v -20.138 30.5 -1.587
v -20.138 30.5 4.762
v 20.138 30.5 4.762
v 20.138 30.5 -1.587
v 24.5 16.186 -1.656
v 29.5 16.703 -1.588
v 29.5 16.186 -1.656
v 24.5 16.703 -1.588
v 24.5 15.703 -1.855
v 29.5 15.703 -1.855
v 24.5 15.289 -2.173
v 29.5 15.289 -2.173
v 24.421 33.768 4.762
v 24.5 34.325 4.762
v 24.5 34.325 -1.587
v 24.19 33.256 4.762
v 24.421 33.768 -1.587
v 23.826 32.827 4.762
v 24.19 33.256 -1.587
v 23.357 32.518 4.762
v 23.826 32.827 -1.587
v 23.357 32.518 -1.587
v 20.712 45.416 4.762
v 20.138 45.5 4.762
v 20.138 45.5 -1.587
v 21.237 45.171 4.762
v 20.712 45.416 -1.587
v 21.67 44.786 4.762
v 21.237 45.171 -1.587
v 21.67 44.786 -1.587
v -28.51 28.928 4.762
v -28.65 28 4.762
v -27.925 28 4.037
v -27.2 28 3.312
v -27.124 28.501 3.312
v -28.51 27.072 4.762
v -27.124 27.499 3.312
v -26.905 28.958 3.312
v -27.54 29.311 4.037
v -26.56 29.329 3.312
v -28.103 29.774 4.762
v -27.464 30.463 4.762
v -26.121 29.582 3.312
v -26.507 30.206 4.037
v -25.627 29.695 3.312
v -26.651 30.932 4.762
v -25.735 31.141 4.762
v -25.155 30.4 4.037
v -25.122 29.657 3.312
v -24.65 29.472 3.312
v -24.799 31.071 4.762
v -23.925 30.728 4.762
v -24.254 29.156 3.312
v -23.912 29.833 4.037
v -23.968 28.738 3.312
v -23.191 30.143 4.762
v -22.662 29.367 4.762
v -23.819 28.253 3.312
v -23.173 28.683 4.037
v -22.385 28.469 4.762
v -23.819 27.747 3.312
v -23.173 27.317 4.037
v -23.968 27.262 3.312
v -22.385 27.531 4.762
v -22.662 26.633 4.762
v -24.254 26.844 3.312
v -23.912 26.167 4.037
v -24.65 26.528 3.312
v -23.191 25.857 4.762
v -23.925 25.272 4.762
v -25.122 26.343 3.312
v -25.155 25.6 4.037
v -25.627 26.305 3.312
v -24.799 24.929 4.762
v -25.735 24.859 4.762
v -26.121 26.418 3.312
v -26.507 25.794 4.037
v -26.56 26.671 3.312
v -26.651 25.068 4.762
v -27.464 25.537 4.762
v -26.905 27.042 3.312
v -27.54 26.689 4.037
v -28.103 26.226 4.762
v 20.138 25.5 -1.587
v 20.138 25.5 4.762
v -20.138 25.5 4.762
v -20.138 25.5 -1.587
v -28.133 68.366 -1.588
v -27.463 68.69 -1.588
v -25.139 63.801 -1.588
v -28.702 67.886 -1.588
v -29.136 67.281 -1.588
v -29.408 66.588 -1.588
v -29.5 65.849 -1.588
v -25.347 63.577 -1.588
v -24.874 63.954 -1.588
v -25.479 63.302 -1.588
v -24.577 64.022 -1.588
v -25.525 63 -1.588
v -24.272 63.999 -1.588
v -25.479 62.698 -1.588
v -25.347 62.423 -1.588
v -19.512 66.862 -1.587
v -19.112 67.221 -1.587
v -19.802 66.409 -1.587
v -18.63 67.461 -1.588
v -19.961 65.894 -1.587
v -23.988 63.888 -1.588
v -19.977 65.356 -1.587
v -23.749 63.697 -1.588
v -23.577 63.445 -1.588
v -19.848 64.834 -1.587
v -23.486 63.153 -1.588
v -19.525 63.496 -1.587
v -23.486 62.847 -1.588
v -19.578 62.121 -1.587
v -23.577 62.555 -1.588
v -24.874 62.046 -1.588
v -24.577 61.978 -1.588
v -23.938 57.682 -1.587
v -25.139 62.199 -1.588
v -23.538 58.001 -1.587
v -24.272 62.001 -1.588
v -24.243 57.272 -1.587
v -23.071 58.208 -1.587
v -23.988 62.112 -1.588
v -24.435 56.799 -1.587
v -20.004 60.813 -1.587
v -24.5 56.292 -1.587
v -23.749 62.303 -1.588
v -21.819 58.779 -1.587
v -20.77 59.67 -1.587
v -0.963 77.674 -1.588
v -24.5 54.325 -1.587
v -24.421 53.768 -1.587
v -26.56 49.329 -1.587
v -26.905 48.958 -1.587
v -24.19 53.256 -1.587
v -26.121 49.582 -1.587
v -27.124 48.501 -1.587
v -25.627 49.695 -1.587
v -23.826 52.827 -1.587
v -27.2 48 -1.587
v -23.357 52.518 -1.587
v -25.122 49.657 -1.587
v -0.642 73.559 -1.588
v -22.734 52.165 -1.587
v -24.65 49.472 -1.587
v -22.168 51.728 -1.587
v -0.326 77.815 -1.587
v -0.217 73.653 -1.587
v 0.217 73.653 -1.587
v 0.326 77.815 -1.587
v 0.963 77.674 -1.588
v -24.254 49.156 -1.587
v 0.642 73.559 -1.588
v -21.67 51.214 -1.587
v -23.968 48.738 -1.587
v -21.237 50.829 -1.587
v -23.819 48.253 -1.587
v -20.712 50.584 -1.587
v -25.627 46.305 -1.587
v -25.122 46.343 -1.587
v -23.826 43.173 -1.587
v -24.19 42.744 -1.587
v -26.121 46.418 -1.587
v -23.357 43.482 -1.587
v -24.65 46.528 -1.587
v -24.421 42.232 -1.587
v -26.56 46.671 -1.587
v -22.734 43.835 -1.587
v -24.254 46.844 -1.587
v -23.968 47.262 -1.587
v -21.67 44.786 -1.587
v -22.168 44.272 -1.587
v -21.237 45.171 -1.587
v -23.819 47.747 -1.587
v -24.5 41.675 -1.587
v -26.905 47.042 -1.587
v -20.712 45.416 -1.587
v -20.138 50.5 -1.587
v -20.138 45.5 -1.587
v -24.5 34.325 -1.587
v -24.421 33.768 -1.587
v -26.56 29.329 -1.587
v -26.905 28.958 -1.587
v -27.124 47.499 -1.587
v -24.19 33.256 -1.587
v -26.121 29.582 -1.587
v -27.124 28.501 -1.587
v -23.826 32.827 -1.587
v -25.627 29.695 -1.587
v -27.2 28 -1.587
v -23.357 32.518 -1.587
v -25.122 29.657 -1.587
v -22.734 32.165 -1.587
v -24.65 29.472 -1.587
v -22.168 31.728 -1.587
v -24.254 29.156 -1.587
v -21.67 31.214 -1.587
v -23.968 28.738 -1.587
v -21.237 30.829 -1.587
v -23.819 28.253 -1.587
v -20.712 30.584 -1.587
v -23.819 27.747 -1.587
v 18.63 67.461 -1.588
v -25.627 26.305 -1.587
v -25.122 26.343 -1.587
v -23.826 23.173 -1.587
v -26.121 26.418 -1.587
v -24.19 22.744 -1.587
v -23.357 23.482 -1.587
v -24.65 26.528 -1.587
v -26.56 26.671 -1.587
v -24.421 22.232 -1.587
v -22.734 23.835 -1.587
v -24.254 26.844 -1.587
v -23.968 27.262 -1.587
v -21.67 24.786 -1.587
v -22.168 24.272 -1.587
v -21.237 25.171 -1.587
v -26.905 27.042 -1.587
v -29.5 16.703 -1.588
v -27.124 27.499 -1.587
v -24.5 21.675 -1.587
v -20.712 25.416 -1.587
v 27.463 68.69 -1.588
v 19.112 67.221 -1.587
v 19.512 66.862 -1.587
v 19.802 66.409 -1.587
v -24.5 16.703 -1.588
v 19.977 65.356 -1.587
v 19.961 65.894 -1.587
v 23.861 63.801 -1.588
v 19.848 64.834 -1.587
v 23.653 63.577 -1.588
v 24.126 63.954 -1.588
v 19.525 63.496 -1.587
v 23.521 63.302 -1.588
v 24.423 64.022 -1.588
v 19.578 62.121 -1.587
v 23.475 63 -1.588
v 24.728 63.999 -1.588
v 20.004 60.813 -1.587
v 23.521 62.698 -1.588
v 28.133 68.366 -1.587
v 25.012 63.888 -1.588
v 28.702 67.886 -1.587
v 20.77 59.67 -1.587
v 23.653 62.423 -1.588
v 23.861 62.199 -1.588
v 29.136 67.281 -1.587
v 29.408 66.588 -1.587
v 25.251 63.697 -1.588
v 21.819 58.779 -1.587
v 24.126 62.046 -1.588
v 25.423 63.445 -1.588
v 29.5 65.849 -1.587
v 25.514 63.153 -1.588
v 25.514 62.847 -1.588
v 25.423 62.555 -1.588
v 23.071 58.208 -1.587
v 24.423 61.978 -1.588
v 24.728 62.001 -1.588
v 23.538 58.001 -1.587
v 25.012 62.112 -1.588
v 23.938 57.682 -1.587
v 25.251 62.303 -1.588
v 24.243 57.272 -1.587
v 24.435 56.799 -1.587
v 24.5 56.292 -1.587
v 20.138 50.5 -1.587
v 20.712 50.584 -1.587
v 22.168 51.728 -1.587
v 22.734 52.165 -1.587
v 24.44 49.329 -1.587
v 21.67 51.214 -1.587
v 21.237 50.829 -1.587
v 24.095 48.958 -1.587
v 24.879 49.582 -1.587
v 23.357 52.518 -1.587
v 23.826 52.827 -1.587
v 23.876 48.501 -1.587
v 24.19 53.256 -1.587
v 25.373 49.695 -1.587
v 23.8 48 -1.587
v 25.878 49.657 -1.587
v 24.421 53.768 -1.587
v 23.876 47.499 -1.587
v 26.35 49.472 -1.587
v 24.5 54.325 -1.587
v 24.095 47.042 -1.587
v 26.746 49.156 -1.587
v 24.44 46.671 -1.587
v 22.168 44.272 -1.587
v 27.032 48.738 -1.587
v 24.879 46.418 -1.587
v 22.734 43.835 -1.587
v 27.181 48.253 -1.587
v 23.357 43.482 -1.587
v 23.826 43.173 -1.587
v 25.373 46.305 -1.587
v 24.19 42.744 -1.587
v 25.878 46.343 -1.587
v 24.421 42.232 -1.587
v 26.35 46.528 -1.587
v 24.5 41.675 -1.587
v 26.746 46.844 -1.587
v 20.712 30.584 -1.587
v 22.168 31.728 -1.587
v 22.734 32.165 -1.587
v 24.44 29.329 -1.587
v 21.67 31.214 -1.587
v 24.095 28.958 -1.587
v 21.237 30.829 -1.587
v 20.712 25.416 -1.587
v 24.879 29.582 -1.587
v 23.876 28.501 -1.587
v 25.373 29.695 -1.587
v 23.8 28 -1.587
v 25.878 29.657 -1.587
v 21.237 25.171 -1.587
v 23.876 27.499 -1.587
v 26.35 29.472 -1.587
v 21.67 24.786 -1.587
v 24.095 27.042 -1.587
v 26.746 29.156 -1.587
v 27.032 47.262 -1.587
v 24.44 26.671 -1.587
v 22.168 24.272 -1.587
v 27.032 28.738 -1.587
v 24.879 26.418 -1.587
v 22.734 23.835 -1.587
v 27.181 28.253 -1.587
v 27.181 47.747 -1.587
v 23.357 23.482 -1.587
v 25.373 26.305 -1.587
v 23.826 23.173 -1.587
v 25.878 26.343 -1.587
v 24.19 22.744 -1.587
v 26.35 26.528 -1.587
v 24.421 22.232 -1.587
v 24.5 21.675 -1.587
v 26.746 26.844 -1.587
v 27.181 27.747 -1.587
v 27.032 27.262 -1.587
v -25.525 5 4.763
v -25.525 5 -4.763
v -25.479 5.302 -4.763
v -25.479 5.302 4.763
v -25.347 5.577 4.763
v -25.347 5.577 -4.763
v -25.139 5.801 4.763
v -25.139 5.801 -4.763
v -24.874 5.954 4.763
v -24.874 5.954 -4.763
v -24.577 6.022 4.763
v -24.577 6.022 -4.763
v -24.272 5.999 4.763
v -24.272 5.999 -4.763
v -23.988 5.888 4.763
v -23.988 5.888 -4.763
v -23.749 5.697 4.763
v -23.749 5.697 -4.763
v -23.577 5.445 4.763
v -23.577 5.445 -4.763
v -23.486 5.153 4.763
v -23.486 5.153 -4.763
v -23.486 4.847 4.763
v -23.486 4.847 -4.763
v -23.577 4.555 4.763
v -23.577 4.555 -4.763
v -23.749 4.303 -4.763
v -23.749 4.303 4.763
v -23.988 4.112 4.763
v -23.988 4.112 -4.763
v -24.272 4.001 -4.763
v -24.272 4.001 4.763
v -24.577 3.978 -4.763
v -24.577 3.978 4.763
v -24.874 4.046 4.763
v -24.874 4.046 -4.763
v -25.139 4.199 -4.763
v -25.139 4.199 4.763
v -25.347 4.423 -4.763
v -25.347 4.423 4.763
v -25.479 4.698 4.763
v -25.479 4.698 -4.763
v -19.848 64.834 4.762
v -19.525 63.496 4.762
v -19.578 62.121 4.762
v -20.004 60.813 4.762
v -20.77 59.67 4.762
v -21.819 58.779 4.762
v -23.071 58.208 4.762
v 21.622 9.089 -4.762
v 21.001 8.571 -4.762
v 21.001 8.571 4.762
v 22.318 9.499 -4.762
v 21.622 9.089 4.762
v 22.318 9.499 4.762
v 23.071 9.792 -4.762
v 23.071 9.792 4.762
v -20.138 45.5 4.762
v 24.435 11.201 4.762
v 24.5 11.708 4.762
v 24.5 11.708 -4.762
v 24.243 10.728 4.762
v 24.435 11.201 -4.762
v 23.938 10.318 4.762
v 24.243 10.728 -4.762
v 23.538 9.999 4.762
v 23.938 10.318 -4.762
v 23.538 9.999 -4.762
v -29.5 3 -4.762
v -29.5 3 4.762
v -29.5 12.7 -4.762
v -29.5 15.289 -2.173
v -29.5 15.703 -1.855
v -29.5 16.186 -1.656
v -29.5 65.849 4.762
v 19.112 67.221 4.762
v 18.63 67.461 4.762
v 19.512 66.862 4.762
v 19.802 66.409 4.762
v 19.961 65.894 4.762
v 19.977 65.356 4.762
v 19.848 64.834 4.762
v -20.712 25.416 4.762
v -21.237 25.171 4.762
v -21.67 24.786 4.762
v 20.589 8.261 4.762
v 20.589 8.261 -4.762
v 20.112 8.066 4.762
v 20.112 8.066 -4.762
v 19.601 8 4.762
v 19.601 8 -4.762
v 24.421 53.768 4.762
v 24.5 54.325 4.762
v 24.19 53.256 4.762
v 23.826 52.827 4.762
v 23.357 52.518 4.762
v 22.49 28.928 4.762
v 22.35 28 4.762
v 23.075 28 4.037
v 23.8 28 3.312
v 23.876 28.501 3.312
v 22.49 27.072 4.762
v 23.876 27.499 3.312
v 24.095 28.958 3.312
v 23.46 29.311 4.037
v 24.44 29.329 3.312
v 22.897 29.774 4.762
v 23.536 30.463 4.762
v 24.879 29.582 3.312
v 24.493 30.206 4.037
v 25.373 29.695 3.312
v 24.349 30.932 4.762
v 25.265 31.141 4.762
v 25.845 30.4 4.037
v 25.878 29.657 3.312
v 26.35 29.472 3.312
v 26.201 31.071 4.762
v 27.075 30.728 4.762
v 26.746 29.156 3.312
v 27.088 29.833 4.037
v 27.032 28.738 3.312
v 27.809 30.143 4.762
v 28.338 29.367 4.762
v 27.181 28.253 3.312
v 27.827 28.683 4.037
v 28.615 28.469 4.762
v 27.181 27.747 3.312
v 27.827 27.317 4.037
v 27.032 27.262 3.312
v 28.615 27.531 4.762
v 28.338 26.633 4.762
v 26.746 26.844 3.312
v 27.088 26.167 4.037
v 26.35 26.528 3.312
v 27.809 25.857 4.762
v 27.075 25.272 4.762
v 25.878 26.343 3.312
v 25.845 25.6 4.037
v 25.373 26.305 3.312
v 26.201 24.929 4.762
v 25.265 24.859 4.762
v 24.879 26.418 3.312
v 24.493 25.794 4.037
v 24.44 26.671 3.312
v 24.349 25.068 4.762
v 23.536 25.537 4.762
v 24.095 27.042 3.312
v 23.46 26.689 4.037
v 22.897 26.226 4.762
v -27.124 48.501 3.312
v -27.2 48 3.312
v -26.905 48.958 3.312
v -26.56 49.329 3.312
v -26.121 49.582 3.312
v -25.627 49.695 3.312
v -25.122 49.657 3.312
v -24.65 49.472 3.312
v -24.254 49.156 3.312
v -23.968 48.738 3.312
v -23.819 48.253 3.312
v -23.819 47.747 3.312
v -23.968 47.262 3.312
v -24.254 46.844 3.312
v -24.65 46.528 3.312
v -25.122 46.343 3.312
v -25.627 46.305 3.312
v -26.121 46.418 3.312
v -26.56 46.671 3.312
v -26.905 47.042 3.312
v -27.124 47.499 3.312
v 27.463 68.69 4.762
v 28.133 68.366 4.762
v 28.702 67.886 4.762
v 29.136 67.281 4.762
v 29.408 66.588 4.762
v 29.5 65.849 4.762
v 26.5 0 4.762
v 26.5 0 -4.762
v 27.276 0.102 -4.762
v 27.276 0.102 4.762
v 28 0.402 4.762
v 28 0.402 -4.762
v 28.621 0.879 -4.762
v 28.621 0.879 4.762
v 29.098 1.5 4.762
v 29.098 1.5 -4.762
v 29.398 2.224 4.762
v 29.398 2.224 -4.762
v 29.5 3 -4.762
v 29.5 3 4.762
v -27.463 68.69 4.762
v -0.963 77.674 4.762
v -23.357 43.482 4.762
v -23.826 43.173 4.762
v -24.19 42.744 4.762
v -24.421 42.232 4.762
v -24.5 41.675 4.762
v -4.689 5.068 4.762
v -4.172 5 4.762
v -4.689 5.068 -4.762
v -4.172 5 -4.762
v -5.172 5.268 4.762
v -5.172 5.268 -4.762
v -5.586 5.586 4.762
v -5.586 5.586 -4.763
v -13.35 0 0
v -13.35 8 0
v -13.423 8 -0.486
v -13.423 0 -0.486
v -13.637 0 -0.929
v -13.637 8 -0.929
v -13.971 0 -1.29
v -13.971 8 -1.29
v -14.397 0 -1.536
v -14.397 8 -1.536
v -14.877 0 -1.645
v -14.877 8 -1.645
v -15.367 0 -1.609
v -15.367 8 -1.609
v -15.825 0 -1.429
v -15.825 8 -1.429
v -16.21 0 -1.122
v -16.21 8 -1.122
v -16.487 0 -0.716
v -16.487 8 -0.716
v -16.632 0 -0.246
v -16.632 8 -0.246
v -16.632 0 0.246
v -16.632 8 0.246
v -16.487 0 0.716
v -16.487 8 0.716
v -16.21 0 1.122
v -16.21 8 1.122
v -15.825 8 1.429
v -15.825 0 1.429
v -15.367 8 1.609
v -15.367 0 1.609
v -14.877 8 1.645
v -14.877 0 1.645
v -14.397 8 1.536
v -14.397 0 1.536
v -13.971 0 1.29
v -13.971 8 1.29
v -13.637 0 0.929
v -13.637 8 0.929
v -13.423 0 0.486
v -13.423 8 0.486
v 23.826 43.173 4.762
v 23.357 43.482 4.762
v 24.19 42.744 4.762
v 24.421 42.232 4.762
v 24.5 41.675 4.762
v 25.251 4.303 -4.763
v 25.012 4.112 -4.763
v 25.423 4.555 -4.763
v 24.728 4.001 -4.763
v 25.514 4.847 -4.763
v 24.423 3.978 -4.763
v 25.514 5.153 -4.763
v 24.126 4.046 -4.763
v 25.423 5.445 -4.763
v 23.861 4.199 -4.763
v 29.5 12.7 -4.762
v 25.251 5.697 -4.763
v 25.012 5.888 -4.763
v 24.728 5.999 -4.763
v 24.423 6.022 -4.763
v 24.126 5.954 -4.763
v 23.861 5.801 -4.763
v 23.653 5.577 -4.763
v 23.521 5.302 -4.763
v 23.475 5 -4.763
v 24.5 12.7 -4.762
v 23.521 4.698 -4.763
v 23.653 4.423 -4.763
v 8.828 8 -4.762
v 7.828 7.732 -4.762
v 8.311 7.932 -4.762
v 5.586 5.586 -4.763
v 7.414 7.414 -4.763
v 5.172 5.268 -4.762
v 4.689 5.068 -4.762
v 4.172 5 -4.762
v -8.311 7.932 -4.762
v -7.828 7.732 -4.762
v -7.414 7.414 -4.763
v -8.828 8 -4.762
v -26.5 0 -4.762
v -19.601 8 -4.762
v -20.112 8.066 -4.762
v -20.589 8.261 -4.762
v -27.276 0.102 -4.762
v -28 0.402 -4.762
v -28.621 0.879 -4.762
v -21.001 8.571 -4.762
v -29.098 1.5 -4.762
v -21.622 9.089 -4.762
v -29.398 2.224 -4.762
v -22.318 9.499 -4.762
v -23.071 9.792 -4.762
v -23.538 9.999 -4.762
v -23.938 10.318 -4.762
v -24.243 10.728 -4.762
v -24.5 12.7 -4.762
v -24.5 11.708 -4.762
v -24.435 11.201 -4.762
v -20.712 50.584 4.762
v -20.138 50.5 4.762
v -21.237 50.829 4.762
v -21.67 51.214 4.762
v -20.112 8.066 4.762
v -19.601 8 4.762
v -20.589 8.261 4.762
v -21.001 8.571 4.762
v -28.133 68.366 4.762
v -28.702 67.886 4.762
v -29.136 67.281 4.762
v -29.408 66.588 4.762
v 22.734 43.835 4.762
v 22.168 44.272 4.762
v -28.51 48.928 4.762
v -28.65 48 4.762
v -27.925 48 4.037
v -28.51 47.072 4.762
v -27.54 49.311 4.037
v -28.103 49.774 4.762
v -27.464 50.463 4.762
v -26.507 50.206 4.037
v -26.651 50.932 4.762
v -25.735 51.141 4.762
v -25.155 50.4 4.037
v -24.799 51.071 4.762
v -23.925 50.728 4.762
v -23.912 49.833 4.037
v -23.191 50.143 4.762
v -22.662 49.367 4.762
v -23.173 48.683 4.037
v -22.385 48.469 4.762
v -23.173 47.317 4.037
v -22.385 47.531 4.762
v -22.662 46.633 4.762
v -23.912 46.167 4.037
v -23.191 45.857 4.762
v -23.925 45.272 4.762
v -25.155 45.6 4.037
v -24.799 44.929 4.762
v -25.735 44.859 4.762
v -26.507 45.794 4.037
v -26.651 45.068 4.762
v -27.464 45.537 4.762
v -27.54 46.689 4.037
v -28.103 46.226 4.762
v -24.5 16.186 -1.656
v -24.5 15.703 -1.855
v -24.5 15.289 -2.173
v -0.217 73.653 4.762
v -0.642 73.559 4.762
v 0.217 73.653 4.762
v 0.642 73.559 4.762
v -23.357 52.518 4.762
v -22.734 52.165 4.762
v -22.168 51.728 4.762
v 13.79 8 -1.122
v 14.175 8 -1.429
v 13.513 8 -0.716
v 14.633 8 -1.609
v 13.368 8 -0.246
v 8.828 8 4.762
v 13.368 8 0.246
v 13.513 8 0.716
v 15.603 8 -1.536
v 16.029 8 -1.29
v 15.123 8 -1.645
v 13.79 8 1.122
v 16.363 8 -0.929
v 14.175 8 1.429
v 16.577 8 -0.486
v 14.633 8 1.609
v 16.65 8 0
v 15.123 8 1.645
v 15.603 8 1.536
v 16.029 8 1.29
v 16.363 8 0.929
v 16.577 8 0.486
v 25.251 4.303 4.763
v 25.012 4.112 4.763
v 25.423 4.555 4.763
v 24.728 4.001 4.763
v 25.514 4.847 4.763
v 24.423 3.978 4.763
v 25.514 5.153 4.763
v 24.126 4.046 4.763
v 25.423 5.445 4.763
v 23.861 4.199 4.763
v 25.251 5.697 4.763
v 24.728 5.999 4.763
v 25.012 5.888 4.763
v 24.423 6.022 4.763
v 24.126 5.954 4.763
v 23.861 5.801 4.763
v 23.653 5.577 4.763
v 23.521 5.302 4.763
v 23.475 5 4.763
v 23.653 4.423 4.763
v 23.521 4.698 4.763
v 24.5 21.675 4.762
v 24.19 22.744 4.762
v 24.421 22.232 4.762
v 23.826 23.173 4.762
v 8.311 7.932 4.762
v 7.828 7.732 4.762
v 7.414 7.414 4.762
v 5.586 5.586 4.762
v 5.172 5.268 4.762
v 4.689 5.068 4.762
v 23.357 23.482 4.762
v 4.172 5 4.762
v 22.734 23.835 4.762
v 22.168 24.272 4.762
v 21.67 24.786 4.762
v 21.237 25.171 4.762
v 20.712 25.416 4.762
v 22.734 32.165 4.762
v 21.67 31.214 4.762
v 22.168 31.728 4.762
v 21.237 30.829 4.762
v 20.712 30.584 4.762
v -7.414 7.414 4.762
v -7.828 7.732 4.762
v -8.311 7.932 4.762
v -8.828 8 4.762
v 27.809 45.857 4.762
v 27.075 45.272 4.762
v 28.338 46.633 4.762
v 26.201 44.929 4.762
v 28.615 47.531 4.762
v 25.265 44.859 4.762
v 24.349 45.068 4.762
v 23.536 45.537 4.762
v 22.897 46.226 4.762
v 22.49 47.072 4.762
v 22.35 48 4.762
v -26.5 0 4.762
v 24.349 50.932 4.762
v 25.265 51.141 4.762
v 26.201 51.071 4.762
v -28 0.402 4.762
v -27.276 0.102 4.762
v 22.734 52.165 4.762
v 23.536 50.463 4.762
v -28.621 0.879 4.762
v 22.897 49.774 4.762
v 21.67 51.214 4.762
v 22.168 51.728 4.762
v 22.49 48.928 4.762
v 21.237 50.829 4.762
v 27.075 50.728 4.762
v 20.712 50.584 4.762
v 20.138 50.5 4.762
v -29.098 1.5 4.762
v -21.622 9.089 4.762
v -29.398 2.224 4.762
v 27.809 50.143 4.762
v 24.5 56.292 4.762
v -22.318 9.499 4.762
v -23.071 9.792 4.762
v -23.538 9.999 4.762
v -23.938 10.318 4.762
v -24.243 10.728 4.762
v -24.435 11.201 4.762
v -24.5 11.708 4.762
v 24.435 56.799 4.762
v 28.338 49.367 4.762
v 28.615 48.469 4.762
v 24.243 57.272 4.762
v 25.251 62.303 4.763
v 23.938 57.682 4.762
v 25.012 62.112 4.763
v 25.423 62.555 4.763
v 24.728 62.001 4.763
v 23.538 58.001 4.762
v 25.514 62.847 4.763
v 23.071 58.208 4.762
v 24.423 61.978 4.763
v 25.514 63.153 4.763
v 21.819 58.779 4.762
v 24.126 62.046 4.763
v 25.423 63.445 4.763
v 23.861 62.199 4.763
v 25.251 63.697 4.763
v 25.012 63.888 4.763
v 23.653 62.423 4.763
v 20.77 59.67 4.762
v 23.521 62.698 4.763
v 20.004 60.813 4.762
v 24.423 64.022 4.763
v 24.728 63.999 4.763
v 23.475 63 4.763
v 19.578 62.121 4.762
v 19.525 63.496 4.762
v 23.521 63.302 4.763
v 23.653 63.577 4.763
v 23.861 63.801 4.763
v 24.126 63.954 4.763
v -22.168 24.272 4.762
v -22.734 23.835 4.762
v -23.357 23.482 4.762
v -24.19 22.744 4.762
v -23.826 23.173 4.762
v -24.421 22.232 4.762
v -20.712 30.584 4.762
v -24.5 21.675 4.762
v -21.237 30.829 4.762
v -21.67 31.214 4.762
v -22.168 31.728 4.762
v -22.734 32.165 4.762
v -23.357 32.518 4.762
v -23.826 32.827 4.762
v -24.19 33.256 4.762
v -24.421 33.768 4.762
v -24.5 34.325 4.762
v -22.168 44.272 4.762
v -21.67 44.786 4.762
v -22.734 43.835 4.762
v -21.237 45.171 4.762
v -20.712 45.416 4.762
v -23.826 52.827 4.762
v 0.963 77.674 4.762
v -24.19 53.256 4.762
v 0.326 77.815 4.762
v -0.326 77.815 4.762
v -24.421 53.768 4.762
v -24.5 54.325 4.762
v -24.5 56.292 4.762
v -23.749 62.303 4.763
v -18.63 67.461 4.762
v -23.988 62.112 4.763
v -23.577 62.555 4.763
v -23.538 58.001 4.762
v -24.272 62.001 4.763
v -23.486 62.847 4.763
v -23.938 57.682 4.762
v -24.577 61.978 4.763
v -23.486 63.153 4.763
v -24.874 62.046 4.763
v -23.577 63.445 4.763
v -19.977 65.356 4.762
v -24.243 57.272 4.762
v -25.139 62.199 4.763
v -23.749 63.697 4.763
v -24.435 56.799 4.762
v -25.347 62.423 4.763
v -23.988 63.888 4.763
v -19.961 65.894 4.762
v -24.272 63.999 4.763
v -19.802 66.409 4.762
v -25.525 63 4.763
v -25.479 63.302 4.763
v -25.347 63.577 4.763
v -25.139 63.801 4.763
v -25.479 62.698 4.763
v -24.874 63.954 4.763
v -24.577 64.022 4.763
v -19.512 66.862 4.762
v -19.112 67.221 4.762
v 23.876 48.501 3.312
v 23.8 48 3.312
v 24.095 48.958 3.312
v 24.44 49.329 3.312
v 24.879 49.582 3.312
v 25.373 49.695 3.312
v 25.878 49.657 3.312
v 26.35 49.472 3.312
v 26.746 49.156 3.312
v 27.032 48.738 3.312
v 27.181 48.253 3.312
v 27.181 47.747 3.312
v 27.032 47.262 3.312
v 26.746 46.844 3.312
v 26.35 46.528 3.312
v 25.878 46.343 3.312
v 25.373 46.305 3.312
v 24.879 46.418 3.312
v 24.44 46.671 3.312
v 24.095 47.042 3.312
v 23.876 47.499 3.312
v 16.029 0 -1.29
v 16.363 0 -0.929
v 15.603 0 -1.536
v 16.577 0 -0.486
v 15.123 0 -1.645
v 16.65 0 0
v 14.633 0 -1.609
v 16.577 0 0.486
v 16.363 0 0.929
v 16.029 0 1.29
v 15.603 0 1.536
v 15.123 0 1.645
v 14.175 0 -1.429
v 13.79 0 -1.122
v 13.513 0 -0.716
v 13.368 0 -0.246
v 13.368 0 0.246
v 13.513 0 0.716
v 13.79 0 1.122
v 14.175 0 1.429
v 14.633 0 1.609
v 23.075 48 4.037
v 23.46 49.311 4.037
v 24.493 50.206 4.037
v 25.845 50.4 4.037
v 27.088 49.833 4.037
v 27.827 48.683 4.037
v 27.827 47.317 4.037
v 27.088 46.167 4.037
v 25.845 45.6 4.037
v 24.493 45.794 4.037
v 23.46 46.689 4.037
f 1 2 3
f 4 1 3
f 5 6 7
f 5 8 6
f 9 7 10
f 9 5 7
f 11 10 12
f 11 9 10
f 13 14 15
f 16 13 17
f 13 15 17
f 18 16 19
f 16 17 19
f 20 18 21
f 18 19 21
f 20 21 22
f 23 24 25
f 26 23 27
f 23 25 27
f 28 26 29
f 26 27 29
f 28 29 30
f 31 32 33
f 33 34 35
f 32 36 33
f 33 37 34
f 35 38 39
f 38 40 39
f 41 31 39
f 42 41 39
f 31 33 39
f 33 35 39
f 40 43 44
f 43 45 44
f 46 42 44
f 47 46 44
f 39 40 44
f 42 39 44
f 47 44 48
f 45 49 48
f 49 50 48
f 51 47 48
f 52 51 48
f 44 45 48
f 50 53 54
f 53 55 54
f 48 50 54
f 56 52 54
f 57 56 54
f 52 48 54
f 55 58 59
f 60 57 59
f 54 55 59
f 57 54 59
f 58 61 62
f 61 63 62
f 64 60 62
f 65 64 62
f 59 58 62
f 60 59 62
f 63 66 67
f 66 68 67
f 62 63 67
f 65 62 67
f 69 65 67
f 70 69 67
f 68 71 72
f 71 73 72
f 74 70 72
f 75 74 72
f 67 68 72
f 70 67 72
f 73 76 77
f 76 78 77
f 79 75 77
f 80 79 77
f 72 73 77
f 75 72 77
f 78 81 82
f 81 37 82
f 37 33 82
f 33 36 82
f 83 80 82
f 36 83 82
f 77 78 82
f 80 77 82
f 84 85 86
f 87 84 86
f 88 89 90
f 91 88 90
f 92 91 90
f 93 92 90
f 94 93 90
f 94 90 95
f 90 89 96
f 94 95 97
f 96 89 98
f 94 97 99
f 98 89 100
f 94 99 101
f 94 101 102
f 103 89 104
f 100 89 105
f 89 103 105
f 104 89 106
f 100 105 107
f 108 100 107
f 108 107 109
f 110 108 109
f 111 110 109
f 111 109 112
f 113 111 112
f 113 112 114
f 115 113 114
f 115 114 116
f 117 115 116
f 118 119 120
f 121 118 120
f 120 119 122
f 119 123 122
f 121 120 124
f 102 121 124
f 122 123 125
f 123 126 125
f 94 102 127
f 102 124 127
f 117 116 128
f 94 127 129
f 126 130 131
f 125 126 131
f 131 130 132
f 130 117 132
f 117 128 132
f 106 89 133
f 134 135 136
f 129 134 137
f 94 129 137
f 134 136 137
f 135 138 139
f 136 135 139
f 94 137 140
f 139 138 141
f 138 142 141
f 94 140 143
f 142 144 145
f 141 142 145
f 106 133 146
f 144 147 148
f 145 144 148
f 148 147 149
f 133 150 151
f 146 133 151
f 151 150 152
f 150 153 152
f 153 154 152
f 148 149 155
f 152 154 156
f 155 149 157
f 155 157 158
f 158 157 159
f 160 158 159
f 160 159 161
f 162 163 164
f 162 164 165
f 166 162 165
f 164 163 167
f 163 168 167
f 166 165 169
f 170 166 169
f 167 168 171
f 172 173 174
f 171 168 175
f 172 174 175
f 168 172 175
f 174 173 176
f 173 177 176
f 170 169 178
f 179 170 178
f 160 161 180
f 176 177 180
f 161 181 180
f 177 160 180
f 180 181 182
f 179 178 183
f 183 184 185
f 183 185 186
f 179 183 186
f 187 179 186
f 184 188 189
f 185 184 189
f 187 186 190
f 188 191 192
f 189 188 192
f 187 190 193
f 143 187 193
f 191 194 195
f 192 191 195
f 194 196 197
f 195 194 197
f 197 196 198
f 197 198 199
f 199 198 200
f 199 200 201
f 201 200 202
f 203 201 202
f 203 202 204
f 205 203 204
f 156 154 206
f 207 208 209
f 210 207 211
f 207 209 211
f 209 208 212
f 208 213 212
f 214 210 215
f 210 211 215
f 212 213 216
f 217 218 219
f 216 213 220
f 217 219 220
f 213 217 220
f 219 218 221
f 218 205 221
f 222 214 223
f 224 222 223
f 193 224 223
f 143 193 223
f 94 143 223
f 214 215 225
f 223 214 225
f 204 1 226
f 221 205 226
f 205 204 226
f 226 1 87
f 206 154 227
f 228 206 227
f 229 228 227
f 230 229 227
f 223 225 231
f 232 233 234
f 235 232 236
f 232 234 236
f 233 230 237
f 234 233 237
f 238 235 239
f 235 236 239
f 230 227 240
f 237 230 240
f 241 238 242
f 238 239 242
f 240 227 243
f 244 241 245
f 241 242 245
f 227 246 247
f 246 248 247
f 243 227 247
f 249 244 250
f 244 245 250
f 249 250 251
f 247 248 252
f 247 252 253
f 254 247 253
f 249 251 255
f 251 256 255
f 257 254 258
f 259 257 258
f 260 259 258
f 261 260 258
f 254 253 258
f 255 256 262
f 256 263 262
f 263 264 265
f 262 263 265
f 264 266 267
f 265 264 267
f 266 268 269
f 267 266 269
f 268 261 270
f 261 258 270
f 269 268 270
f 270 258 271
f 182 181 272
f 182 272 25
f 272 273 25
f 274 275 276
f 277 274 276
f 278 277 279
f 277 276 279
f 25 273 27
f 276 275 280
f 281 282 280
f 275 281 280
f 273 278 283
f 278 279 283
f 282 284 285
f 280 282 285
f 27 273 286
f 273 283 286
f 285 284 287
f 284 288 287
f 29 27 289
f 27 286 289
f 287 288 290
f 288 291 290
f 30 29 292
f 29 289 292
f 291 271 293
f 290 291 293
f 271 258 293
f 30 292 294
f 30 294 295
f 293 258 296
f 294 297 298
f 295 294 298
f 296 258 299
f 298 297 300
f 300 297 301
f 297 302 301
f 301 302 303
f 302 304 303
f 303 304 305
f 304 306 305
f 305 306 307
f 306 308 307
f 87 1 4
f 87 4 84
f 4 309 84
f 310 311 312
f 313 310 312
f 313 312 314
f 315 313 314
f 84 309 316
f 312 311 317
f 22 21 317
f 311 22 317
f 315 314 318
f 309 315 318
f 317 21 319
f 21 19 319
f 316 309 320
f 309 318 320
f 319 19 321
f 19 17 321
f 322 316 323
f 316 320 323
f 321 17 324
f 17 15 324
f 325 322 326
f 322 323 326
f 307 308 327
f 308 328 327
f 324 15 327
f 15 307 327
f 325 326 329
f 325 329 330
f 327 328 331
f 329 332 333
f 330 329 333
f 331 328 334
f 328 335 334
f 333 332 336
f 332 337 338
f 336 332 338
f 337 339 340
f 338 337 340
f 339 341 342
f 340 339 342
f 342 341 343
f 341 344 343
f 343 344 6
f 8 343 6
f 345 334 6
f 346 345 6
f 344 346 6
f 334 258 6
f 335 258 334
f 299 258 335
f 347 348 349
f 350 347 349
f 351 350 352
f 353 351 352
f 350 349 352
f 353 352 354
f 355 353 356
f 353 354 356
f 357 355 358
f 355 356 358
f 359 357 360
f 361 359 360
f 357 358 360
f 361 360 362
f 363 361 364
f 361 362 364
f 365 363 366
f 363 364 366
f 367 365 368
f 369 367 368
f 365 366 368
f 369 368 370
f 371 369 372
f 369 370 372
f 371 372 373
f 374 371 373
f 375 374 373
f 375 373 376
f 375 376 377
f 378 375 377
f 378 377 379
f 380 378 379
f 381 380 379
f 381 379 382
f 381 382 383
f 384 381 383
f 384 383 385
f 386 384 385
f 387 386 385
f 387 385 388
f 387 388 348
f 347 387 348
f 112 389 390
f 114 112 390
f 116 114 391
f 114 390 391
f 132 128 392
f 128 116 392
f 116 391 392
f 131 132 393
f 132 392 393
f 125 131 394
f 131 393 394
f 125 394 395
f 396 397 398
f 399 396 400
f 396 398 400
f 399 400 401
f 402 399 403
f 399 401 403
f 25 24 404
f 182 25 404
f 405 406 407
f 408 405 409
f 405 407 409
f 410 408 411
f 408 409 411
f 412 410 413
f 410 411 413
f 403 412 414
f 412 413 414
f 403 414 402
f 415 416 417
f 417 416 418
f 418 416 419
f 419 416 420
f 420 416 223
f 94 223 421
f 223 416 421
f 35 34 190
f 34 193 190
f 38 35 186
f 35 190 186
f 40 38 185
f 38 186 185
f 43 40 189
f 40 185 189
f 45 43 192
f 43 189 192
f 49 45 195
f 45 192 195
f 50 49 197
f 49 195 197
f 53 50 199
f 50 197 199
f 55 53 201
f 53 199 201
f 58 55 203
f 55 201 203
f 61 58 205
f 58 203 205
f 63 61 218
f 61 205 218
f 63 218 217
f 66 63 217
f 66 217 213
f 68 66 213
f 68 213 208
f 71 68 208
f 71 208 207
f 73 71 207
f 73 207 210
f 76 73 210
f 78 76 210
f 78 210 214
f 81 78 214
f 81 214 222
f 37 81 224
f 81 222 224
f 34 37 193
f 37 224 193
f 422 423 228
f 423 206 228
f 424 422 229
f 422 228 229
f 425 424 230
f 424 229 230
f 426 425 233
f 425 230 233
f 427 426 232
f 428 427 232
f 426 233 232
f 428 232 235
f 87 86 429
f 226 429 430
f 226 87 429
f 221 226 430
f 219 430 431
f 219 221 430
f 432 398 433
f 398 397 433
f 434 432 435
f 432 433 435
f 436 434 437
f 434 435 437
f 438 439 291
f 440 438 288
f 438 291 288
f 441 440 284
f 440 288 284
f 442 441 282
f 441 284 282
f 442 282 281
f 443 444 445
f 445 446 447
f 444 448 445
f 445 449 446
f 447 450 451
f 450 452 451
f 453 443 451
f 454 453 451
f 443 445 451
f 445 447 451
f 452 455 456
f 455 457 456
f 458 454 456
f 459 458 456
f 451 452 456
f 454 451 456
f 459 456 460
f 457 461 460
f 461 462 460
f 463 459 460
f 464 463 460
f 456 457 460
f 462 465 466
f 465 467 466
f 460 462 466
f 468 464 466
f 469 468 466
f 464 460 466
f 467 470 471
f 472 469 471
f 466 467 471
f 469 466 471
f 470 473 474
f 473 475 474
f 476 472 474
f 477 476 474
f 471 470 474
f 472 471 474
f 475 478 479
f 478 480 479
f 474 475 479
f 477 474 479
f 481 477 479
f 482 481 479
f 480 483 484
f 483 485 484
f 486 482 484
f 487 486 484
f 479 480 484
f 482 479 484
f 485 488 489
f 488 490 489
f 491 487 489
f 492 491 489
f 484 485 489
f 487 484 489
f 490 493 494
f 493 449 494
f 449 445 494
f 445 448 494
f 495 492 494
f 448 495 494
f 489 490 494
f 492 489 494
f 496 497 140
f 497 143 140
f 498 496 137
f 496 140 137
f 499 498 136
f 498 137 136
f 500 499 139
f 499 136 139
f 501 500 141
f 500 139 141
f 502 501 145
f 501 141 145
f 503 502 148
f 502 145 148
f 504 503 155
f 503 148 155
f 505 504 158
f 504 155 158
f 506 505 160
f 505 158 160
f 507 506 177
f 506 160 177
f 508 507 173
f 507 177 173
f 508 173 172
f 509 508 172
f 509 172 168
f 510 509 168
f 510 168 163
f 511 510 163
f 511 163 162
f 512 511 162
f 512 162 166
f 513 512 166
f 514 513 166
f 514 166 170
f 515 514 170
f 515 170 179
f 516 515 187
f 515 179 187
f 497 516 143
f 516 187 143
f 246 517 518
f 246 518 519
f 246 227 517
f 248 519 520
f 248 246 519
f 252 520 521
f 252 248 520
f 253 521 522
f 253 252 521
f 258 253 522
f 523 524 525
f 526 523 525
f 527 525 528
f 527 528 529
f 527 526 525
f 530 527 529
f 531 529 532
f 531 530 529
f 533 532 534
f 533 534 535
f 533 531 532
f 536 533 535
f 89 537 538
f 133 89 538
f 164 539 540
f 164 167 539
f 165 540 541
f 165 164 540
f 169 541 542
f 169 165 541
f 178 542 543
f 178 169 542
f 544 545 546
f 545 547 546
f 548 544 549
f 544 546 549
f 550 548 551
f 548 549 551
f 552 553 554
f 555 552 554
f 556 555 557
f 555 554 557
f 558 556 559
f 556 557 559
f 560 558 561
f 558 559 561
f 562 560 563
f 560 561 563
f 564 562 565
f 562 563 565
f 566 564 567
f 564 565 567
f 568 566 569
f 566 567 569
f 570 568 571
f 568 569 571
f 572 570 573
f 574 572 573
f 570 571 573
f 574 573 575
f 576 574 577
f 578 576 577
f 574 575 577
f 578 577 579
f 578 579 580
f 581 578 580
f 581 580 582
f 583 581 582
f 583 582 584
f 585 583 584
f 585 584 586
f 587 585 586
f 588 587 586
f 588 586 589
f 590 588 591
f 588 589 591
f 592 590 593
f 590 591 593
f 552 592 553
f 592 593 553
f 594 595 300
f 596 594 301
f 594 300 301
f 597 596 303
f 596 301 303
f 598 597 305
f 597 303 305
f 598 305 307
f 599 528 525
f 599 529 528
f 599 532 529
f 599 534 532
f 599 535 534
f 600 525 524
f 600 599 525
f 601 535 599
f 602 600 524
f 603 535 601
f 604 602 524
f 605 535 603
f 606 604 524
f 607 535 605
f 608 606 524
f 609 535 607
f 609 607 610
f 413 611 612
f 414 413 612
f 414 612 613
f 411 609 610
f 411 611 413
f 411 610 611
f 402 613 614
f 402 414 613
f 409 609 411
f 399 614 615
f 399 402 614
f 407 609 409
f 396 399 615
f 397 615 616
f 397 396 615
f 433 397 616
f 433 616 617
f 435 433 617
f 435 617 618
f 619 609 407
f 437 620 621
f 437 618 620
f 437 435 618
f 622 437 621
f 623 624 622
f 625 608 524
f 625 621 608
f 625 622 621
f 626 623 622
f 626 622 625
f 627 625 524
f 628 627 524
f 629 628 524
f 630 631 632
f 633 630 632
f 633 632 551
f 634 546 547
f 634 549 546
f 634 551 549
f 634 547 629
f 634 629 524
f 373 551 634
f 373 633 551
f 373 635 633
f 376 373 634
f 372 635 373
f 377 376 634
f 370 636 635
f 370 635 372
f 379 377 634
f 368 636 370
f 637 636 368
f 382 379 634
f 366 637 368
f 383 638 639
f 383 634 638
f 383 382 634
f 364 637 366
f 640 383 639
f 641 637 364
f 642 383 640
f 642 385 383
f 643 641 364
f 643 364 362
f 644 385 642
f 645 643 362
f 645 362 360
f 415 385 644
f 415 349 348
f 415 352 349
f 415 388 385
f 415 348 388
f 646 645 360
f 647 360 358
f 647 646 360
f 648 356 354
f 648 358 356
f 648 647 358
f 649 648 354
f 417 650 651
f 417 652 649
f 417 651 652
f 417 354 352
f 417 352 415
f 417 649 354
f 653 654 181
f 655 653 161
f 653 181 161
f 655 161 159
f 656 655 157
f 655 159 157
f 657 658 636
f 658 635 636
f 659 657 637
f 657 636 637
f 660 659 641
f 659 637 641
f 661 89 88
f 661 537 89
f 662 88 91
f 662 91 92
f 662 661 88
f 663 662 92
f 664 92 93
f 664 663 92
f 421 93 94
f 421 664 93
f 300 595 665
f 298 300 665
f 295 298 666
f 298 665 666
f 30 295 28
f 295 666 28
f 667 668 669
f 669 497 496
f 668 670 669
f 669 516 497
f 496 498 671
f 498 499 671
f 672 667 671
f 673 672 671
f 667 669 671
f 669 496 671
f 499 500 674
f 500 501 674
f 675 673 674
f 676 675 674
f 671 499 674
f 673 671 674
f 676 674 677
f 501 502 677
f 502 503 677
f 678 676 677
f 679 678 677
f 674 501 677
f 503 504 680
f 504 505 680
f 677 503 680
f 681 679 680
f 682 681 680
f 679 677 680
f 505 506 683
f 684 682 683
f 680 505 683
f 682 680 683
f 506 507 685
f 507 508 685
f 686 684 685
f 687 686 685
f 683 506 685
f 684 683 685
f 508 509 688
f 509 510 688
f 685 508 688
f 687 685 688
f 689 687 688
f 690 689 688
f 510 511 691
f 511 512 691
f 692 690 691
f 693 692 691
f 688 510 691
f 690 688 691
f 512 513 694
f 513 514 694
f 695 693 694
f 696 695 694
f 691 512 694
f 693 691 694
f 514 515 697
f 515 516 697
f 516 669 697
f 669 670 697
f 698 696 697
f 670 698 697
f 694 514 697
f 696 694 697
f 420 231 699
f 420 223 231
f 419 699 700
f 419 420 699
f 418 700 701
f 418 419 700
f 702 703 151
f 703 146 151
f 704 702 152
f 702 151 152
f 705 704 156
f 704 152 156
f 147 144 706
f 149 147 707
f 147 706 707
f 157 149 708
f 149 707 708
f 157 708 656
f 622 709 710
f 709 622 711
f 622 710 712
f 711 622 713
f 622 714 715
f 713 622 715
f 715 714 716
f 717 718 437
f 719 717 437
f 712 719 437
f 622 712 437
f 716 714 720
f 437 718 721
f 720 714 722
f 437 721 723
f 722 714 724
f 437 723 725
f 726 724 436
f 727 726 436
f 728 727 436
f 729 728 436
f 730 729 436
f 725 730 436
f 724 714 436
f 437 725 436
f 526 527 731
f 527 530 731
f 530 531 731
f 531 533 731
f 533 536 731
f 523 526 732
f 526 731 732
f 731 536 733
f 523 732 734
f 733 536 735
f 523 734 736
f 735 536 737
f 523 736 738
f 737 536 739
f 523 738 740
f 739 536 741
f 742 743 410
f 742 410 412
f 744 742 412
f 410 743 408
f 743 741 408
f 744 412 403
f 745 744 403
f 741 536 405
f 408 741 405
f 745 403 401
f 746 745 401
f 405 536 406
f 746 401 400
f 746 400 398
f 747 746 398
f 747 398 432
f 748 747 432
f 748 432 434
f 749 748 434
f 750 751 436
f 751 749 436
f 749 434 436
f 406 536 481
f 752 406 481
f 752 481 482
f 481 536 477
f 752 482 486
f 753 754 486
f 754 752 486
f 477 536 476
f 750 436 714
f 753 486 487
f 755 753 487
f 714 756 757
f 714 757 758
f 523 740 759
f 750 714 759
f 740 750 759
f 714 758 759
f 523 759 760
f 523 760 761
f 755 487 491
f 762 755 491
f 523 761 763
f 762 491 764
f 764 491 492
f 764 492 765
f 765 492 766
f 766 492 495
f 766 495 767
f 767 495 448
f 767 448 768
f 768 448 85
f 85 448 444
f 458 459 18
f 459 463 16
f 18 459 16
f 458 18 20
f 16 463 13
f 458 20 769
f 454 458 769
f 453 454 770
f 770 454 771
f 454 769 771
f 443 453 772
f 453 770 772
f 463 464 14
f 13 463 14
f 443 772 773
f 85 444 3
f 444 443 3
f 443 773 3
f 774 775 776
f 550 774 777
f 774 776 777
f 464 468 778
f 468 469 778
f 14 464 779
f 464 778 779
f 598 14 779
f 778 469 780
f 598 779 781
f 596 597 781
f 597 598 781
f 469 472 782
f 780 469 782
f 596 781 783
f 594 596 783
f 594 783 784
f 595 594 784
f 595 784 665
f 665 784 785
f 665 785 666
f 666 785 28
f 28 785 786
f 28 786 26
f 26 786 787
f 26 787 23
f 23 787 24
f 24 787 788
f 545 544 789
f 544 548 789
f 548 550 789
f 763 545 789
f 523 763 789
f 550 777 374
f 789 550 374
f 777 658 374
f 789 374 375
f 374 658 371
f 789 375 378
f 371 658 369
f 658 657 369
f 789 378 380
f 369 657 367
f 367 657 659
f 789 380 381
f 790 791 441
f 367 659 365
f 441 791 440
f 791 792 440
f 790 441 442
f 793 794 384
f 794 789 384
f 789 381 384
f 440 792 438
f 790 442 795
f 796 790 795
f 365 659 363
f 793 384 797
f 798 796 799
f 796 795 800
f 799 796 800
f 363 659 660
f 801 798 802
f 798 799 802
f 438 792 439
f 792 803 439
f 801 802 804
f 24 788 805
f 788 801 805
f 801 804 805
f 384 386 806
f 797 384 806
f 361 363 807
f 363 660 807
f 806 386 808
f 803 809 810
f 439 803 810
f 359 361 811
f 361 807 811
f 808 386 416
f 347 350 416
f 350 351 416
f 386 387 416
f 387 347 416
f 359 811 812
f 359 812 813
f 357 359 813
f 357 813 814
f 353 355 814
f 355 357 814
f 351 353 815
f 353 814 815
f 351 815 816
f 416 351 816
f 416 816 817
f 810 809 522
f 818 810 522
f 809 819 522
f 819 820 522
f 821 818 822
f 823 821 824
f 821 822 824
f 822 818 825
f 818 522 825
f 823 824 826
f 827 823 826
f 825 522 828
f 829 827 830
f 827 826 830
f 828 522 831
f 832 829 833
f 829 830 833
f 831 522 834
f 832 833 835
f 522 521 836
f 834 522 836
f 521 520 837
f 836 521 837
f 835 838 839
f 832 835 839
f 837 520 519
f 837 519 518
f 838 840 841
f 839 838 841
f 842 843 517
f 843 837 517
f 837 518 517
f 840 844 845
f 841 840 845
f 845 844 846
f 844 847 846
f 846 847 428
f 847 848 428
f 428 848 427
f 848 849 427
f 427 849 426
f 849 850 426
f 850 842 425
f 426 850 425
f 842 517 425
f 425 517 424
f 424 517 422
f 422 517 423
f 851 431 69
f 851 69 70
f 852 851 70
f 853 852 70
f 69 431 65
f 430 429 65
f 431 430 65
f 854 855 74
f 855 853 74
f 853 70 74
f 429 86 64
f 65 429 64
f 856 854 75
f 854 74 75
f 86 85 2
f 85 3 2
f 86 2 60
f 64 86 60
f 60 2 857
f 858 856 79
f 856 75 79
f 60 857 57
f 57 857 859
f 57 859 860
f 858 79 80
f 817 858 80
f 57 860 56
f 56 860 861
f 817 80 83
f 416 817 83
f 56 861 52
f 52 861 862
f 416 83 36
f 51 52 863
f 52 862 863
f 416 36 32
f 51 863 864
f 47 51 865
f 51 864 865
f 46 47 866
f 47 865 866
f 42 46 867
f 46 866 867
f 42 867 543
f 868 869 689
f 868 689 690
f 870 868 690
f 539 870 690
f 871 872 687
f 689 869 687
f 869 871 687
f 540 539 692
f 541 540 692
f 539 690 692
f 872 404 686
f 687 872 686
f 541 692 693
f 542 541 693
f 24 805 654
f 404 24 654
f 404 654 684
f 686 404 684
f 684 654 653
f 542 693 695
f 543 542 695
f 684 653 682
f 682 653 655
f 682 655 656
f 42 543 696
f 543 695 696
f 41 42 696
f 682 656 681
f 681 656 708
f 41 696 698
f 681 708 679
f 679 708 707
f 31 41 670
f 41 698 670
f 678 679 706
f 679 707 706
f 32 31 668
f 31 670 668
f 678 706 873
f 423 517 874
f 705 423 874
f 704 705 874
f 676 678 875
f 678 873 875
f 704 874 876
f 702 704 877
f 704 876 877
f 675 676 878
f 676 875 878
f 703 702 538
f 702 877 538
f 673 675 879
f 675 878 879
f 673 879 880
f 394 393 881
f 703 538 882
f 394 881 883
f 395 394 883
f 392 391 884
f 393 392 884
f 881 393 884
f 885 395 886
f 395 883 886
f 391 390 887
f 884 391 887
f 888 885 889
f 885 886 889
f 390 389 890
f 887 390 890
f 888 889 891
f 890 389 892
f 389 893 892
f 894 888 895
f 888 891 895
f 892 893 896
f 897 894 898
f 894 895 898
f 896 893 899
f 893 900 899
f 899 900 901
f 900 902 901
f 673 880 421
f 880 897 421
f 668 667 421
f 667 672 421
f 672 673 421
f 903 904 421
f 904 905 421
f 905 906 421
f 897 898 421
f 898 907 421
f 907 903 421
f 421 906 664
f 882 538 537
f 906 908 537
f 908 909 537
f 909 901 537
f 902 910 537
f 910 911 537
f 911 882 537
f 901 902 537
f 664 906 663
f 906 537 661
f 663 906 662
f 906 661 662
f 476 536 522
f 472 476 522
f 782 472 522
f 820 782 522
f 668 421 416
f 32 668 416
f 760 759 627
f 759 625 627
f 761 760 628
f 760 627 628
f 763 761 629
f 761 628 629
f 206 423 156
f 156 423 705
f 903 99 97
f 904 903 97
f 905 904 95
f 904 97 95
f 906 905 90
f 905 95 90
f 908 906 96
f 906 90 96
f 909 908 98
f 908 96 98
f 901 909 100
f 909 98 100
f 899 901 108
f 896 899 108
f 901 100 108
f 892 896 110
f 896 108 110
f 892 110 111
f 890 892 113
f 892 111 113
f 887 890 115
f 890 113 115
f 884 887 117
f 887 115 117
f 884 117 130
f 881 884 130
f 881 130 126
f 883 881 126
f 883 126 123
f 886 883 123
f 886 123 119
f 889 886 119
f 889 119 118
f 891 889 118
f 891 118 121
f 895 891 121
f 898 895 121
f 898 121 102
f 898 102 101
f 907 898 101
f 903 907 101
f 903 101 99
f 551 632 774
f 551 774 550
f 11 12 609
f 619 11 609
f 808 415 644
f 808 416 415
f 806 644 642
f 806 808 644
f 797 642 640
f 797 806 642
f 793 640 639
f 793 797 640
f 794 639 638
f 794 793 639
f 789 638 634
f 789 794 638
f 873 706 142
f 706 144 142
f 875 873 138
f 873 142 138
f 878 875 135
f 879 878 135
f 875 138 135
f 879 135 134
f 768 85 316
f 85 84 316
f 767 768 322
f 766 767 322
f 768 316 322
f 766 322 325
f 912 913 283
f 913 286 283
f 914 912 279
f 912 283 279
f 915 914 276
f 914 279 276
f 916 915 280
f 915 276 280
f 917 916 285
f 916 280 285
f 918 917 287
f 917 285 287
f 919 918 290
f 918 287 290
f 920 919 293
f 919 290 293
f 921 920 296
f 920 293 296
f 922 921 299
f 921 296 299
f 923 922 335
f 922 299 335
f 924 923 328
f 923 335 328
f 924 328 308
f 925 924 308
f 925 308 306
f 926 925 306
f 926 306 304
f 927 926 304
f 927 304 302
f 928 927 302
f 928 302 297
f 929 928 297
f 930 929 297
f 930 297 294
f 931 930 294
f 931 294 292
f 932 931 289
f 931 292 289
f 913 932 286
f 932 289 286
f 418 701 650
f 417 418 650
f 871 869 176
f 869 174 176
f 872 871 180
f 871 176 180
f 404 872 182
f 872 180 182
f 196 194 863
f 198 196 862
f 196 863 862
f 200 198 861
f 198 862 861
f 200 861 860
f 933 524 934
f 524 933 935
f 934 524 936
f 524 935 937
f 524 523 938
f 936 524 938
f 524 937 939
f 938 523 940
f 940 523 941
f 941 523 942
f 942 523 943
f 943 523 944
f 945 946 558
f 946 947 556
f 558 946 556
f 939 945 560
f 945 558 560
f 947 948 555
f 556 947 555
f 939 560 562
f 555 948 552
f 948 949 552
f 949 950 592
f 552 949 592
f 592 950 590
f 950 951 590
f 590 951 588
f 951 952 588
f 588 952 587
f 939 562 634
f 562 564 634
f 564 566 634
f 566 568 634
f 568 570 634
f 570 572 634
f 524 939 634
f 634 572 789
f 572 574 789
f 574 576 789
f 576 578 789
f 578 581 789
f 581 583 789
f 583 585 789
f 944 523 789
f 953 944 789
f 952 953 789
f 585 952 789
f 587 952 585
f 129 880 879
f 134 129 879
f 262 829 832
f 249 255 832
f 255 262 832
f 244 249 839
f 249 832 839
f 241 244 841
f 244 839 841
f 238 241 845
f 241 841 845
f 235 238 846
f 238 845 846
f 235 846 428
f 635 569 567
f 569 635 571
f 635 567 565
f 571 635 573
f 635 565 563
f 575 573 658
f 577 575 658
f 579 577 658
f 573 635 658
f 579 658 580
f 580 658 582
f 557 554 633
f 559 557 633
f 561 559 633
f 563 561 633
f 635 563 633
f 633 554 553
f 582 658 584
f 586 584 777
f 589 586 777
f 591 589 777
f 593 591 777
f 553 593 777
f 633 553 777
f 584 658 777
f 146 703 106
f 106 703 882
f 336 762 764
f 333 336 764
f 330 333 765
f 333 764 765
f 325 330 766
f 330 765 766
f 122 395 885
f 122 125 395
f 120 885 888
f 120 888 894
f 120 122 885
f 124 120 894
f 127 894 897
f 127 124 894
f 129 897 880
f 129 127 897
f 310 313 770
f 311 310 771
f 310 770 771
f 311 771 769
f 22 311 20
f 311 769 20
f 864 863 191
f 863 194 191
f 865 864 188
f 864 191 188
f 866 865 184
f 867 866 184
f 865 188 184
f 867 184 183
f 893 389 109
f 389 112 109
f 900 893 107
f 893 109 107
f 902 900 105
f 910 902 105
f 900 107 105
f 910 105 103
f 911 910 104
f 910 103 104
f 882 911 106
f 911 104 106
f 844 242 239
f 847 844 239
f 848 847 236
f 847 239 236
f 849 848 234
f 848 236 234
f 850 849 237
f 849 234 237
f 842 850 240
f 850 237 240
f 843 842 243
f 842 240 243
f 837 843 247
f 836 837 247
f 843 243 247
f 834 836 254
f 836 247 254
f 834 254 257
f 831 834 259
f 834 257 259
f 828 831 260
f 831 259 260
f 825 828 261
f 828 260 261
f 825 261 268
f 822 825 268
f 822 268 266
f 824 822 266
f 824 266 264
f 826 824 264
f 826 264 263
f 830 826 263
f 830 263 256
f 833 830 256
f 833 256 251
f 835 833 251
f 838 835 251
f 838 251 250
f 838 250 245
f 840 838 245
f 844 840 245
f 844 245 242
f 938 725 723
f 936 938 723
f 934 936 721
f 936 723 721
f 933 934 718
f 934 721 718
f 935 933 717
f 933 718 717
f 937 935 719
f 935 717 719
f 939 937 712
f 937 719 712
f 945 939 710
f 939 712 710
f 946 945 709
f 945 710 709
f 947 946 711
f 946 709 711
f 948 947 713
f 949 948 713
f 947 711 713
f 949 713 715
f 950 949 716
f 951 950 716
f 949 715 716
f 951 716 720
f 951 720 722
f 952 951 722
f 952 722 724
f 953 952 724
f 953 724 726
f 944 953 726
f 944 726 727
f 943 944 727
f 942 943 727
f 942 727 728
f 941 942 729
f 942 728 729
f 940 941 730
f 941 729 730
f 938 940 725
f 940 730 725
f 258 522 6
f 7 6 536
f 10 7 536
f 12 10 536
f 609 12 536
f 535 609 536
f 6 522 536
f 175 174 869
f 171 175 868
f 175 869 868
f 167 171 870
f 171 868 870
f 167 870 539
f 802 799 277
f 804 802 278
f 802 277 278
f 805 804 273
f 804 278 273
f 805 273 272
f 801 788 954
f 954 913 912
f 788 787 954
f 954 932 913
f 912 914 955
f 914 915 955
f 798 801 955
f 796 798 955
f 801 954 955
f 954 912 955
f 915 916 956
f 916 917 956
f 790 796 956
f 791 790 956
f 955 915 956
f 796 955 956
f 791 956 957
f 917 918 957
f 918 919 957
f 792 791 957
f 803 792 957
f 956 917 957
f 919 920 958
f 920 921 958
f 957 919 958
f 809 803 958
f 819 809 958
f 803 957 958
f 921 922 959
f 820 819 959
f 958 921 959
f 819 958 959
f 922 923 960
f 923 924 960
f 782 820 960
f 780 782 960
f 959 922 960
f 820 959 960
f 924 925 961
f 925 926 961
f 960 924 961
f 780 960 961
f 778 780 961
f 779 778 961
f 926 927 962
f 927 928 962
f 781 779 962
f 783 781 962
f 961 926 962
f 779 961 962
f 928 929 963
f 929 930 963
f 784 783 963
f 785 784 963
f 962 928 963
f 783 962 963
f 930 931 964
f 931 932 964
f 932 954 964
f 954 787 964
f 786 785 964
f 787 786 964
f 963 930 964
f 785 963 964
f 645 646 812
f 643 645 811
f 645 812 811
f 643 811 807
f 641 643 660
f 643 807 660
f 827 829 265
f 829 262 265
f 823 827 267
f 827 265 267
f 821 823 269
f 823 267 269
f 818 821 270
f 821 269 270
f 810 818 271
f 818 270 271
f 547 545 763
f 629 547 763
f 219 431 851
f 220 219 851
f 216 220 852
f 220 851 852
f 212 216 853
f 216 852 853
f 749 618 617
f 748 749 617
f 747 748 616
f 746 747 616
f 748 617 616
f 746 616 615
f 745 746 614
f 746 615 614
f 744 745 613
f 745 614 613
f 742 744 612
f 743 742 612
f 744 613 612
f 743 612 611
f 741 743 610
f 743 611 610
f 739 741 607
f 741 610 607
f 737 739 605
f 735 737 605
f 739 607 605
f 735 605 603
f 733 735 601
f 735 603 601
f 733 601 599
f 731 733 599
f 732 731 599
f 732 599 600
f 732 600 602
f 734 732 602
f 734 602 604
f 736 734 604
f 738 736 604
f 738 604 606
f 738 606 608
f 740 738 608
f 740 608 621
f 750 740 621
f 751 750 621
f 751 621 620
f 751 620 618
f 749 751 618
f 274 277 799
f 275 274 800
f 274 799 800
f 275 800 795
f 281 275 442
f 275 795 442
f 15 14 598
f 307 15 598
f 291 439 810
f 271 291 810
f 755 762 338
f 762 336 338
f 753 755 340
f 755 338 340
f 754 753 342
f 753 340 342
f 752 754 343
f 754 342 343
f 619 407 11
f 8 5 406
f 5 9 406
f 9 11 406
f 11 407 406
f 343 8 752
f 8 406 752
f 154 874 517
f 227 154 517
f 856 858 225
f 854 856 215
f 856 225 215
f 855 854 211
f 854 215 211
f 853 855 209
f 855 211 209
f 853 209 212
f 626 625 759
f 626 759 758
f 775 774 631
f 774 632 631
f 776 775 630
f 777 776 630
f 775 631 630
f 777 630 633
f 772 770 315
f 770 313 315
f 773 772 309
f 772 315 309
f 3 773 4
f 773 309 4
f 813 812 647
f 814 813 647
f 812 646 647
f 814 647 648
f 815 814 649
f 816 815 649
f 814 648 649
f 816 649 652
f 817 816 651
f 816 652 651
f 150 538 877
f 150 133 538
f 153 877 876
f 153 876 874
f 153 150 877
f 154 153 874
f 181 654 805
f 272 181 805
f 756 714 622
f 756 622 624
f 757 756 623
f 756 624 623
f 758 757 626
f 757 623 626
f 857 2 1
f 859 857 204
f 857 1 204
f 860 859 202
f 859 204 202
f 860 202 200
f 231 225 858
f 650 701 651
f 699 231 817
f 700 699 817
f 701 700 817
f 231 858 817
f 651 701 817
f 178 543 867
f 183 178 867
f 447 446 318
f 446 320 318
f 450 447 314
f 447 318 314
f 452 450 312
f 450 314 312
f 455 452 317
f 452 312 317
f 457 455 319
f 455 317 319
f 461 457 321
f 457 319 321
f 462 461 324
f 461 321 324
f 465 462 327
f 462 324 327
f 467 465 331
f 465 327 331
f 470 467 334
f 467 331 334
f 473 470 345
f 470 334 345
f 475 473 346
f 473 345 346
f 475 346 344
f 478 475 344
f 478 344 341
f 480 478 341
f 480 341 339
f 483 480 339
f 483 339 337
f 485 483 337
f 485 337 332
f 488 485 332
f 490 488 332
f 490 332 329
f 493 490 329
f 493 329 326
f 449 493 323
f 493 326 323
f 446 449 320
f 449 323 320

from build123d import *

# Parameters (mm, degrees)
BOSS_EXTRUDE1_DEPTH                             = 4.7625
CUT_EXTRUDE1_DEPTH                              = 98.916706472
FILLET1_R                                       = 3
M2_5X0_45_TAPPED_HOLE1_D                        = 2.05
M4X0_7_TAPPED_HOLE1_D                           = 3.3
M4X0_7_TAPPED_HOLE1_DEPTH                       = 11.5
M4X0_7_TAPPED_HOLE1_TIP                         = 0.991420021
CSK_FOR_M3_FLAT_HEAD_MACHINE_SCREW1_D           = 3.4
CSK_FOR_M3_FLAT_HEAD_MACHINE_SCREW1_CSINK_D     = 6.3
CSK_FOR_M3_FLAT_HEAD_MACHINE_SCREW1_CSINK_ANGLE = 90
CUT_EXTRUDE2_DEPTH                              = 84.778552935
FILLET2_R                                       = 2


with BuildPart() as part:
    # Sketch1 → Boss-Extrude1 (new, symmetric)
    with BuildSketch(Plane.XY):
        Polygon((-29.5, 68), (0, 78), (29.5, 68), (29.5, 0), (-29.5, 0), align=None)
    extrude(amount=BOSS_EXTRUDE1_DEPTH, both=True)

    # Sketch2 → Cut-Extrude1 (cut, through all)
    with BuildSketch(Plane(origin=(29.5, 0, 0), x_dir=(0, 0, -1), z_dir=(1, 0, 0))):
        Polygon((1.5875, 78), (1.5875, 15.875), (4.7625, 12.7), (4.7625, 78), align=None)
    extrude(amount=-CUT_EXTRUDE1_DEPTH, mode=Mode.SUBTRACT)

    # Fillet1
    fillet1_edges = [part.edges().sort_by_distance(p)[0] for p in [
        (0, 78, 1.5875),
        (29.5, 68, 1.5875),
        (29.5, 0, 0),
        (-29.5, 0, 0),
        (-29.5, 68, 1.5875),
    ]]
    fillet(fillet1_edges, radius=FILLET1_R)

    # M2.5x0.45 Tapped Hole1 (through all)
    with Locations(Plane.XY.offset(4.7625)):
        with Locations((-24.5, 5), (24.5, 5), (-24.5, 63), (24.5, 63)):
            Hole(M2_5X0_45_TAPPED_HOLE1_D / 2)

    # M4x0.7 Tapped Hole1
    with Locations(Plane(origin=(0, 0, 0), x_dir=(-1, 0, 0), z_dir=(0, -1, 0))):
        with Locations((-15, 0), (15, 0)):
            Hole(M4X0_7_TAPPED_HOLE1_D / 2, depth=M4X0_7_TAPPED_HOLE1_DEPTH)
            with Locations((0, 0, -(M4X0_7_TAPPED_HOLE1_DEPTH + M4X0_7_TAPPED_HOLE1_TIP / 2))):  # 118° drill point
                Cone(0, M4X0_7_TAPPED_HOLE1_D / 2, M4X0_7_TAPPED_HOLE1_TIP, mode=Mode.SUBTRACT)

    # CSK for M3 Flat Head Machine Screw1 (through all)
    with Locations(Plane.XY.offset(4.7625)):
        with Locations((-25.5, 28), (25.5, 28), (-25.5, 48), (25.5, 48)):
            CounterSinkHole(CSK_FOR_M3_FLAT_HEAD_MACHINE_SCREW1_D / 2, CSK_FOR_M3_FLAT_HEAD_MACHINE_SCREW1_CSINK_D / 2, counter_sink_angle=CSK_FOR_M3_FLAT_HEAD_MACHINE_SCREW1_CSINK_ANGLE)

    # Sketch7 → Cut-Extrude2 (cut, through all)
    with BuildSketch(Plane.XY.offset(4.7625)):
        with BuildLine():
            Line((-24.5, 43.101020514), (-24.5, 32.898979486))
            ThreePointArc((-24.5, 32.898979486), (-22.577443045, 32.056927513), (-21.169872981, 30.5))
            Line((-21.169872981, 30.5), (21.169872981, 30.5))
            ThreePointArc((21.169872981, 30.5), (22.577443045, 32.056927513), (24.5, 32.898979486))
            Line((24.5, 32.898979486), (24.5, 43.101020514))
            ThreePointArc((24.5, 43.101020514), (22.577443045, 43.943072487), (21.169872981, 45.5))
            Line((21.169872981, 45.5), (-21.169872981, 45.5))
            ThreePointArc((-21.169872981, 45.5), (-22.577443045, 43.943072487), (-24.5, 43.101020514))
        make_face()
        with BuildLine():
            ThreePointArc((-21.169872981, 25.5), (-22.577443045, 23.943072487), (-24.5, 23.101020514))
            Line((-24.5, 23.101020514), (-24.5, 10))
            ThreePointArc((-24.5, 10), (-22.263932023, 9.472135955), (-20.5, 8))
            Line((-20.5, 8), (-8, 8))
            Line((-8, 8), (-5, 5))
            Line((-5, 5), (5, 5))
            Line((5, 5), (8, 8))
            Line((8, 8), (20.5, 8))
            ThreePointArc((20.5, 8), (22.263932023, 9.472135955), (24.5, 10))
            Line((24.5, 10), (24.5, 23.101020514))
            ThreePointArc((24.5, 23.101020514), (22.577443045, 23.943072487), (21.169872981, 25.5))
            Line((21.169872981, 25.5), (-21.169872981, 25.5))
        make_face()
        with BuildLine():
            Line((-24.5, 58), (-24.5, 52.898979486))
            ThreePointArc((-24.5, 52.898979486), (-22.577443045, 52.056927513), (-21.169872981, 50.5))
            Line((-21.169872981, 50.5), (21.169872981, 50.5))
            ThreePointArc((21.169872981, 50.5), (22.577443045, 52.056927513), (24.5, 52.898979486))
            Line((24.5, 52.898979486), (24.5, 58))
            ThreePointArc((24.5, 58), (19.853737933, 61.15277267), (21.066919092, 66.635100477))
            Line((21.066919092, 66.635100477), (0, 73.776428982))
            Line((0, 73.776428982), (-21.066919092, 66.635100477))
            ThreePointArc((-21.066919092, 66.635100477), (-19.853737933, 61.15277267), (-24.5, 58))
        make_face()
    extrude(amount=-CUT_EXTRUDE2_DEPTH, mode=Mode.SUBTRACT)

    # Fillet2
    fillet2_edges = [part.edges().sort_by_distance(p)[0] for p in [
        (27, 15.875, -1.5875),
        (21.169872981, 50.5, 1.5875),
        (-21.169872981, 50.5, 1.5875),
        (-24.5, 52.898979486, 1.5875),
        (-24.5, 58, 1.5875),
        (-21.066919092, 66.635100477, 1.5875),
        (0, 73.776428982, 1.5875),
        (21.066919092, 66.635100477, 1.5875),
        (24.5, 58, 1.5875),
        (24.5, 52.898979486, 1.5875),
        (24.5, 43.101020514, 1.5875),
        (24.5, 32.898979486, 1.5875),
        (21.169872981, 30.5, 1.5875),
        (-21.169872981, 30.5, 1.5875),
        (-24.5, 32.898979486, 1.5875),
        (-24.5, 43.101020514, 1.5875),
        (-21.169872981, 45.5, 1.5875),
        (21.169872981, 45.5, 1.5875),
        (-24.5, 23.101020514, 1.5875),
        (-21.169872981, 25.5, 1.5875),
        (21.169872981, 25.5, 1.5875),
        (24.5, 23.101020514, 1.5875),
        (-24.5, 10, 0),
        (-8, 8, 0),
        (20.5, 8, 0),
        (24.5, 10, 0),
        (8, 8, 0),
        (5, 5, 0),
        (-5, 5, 0),
        (-20.5, 8, 0),
        (-27, 15.875, -1.5875),
    ]]
    fillet(fillet2_edges, radius=FILLET2_R)


solid = part.part
